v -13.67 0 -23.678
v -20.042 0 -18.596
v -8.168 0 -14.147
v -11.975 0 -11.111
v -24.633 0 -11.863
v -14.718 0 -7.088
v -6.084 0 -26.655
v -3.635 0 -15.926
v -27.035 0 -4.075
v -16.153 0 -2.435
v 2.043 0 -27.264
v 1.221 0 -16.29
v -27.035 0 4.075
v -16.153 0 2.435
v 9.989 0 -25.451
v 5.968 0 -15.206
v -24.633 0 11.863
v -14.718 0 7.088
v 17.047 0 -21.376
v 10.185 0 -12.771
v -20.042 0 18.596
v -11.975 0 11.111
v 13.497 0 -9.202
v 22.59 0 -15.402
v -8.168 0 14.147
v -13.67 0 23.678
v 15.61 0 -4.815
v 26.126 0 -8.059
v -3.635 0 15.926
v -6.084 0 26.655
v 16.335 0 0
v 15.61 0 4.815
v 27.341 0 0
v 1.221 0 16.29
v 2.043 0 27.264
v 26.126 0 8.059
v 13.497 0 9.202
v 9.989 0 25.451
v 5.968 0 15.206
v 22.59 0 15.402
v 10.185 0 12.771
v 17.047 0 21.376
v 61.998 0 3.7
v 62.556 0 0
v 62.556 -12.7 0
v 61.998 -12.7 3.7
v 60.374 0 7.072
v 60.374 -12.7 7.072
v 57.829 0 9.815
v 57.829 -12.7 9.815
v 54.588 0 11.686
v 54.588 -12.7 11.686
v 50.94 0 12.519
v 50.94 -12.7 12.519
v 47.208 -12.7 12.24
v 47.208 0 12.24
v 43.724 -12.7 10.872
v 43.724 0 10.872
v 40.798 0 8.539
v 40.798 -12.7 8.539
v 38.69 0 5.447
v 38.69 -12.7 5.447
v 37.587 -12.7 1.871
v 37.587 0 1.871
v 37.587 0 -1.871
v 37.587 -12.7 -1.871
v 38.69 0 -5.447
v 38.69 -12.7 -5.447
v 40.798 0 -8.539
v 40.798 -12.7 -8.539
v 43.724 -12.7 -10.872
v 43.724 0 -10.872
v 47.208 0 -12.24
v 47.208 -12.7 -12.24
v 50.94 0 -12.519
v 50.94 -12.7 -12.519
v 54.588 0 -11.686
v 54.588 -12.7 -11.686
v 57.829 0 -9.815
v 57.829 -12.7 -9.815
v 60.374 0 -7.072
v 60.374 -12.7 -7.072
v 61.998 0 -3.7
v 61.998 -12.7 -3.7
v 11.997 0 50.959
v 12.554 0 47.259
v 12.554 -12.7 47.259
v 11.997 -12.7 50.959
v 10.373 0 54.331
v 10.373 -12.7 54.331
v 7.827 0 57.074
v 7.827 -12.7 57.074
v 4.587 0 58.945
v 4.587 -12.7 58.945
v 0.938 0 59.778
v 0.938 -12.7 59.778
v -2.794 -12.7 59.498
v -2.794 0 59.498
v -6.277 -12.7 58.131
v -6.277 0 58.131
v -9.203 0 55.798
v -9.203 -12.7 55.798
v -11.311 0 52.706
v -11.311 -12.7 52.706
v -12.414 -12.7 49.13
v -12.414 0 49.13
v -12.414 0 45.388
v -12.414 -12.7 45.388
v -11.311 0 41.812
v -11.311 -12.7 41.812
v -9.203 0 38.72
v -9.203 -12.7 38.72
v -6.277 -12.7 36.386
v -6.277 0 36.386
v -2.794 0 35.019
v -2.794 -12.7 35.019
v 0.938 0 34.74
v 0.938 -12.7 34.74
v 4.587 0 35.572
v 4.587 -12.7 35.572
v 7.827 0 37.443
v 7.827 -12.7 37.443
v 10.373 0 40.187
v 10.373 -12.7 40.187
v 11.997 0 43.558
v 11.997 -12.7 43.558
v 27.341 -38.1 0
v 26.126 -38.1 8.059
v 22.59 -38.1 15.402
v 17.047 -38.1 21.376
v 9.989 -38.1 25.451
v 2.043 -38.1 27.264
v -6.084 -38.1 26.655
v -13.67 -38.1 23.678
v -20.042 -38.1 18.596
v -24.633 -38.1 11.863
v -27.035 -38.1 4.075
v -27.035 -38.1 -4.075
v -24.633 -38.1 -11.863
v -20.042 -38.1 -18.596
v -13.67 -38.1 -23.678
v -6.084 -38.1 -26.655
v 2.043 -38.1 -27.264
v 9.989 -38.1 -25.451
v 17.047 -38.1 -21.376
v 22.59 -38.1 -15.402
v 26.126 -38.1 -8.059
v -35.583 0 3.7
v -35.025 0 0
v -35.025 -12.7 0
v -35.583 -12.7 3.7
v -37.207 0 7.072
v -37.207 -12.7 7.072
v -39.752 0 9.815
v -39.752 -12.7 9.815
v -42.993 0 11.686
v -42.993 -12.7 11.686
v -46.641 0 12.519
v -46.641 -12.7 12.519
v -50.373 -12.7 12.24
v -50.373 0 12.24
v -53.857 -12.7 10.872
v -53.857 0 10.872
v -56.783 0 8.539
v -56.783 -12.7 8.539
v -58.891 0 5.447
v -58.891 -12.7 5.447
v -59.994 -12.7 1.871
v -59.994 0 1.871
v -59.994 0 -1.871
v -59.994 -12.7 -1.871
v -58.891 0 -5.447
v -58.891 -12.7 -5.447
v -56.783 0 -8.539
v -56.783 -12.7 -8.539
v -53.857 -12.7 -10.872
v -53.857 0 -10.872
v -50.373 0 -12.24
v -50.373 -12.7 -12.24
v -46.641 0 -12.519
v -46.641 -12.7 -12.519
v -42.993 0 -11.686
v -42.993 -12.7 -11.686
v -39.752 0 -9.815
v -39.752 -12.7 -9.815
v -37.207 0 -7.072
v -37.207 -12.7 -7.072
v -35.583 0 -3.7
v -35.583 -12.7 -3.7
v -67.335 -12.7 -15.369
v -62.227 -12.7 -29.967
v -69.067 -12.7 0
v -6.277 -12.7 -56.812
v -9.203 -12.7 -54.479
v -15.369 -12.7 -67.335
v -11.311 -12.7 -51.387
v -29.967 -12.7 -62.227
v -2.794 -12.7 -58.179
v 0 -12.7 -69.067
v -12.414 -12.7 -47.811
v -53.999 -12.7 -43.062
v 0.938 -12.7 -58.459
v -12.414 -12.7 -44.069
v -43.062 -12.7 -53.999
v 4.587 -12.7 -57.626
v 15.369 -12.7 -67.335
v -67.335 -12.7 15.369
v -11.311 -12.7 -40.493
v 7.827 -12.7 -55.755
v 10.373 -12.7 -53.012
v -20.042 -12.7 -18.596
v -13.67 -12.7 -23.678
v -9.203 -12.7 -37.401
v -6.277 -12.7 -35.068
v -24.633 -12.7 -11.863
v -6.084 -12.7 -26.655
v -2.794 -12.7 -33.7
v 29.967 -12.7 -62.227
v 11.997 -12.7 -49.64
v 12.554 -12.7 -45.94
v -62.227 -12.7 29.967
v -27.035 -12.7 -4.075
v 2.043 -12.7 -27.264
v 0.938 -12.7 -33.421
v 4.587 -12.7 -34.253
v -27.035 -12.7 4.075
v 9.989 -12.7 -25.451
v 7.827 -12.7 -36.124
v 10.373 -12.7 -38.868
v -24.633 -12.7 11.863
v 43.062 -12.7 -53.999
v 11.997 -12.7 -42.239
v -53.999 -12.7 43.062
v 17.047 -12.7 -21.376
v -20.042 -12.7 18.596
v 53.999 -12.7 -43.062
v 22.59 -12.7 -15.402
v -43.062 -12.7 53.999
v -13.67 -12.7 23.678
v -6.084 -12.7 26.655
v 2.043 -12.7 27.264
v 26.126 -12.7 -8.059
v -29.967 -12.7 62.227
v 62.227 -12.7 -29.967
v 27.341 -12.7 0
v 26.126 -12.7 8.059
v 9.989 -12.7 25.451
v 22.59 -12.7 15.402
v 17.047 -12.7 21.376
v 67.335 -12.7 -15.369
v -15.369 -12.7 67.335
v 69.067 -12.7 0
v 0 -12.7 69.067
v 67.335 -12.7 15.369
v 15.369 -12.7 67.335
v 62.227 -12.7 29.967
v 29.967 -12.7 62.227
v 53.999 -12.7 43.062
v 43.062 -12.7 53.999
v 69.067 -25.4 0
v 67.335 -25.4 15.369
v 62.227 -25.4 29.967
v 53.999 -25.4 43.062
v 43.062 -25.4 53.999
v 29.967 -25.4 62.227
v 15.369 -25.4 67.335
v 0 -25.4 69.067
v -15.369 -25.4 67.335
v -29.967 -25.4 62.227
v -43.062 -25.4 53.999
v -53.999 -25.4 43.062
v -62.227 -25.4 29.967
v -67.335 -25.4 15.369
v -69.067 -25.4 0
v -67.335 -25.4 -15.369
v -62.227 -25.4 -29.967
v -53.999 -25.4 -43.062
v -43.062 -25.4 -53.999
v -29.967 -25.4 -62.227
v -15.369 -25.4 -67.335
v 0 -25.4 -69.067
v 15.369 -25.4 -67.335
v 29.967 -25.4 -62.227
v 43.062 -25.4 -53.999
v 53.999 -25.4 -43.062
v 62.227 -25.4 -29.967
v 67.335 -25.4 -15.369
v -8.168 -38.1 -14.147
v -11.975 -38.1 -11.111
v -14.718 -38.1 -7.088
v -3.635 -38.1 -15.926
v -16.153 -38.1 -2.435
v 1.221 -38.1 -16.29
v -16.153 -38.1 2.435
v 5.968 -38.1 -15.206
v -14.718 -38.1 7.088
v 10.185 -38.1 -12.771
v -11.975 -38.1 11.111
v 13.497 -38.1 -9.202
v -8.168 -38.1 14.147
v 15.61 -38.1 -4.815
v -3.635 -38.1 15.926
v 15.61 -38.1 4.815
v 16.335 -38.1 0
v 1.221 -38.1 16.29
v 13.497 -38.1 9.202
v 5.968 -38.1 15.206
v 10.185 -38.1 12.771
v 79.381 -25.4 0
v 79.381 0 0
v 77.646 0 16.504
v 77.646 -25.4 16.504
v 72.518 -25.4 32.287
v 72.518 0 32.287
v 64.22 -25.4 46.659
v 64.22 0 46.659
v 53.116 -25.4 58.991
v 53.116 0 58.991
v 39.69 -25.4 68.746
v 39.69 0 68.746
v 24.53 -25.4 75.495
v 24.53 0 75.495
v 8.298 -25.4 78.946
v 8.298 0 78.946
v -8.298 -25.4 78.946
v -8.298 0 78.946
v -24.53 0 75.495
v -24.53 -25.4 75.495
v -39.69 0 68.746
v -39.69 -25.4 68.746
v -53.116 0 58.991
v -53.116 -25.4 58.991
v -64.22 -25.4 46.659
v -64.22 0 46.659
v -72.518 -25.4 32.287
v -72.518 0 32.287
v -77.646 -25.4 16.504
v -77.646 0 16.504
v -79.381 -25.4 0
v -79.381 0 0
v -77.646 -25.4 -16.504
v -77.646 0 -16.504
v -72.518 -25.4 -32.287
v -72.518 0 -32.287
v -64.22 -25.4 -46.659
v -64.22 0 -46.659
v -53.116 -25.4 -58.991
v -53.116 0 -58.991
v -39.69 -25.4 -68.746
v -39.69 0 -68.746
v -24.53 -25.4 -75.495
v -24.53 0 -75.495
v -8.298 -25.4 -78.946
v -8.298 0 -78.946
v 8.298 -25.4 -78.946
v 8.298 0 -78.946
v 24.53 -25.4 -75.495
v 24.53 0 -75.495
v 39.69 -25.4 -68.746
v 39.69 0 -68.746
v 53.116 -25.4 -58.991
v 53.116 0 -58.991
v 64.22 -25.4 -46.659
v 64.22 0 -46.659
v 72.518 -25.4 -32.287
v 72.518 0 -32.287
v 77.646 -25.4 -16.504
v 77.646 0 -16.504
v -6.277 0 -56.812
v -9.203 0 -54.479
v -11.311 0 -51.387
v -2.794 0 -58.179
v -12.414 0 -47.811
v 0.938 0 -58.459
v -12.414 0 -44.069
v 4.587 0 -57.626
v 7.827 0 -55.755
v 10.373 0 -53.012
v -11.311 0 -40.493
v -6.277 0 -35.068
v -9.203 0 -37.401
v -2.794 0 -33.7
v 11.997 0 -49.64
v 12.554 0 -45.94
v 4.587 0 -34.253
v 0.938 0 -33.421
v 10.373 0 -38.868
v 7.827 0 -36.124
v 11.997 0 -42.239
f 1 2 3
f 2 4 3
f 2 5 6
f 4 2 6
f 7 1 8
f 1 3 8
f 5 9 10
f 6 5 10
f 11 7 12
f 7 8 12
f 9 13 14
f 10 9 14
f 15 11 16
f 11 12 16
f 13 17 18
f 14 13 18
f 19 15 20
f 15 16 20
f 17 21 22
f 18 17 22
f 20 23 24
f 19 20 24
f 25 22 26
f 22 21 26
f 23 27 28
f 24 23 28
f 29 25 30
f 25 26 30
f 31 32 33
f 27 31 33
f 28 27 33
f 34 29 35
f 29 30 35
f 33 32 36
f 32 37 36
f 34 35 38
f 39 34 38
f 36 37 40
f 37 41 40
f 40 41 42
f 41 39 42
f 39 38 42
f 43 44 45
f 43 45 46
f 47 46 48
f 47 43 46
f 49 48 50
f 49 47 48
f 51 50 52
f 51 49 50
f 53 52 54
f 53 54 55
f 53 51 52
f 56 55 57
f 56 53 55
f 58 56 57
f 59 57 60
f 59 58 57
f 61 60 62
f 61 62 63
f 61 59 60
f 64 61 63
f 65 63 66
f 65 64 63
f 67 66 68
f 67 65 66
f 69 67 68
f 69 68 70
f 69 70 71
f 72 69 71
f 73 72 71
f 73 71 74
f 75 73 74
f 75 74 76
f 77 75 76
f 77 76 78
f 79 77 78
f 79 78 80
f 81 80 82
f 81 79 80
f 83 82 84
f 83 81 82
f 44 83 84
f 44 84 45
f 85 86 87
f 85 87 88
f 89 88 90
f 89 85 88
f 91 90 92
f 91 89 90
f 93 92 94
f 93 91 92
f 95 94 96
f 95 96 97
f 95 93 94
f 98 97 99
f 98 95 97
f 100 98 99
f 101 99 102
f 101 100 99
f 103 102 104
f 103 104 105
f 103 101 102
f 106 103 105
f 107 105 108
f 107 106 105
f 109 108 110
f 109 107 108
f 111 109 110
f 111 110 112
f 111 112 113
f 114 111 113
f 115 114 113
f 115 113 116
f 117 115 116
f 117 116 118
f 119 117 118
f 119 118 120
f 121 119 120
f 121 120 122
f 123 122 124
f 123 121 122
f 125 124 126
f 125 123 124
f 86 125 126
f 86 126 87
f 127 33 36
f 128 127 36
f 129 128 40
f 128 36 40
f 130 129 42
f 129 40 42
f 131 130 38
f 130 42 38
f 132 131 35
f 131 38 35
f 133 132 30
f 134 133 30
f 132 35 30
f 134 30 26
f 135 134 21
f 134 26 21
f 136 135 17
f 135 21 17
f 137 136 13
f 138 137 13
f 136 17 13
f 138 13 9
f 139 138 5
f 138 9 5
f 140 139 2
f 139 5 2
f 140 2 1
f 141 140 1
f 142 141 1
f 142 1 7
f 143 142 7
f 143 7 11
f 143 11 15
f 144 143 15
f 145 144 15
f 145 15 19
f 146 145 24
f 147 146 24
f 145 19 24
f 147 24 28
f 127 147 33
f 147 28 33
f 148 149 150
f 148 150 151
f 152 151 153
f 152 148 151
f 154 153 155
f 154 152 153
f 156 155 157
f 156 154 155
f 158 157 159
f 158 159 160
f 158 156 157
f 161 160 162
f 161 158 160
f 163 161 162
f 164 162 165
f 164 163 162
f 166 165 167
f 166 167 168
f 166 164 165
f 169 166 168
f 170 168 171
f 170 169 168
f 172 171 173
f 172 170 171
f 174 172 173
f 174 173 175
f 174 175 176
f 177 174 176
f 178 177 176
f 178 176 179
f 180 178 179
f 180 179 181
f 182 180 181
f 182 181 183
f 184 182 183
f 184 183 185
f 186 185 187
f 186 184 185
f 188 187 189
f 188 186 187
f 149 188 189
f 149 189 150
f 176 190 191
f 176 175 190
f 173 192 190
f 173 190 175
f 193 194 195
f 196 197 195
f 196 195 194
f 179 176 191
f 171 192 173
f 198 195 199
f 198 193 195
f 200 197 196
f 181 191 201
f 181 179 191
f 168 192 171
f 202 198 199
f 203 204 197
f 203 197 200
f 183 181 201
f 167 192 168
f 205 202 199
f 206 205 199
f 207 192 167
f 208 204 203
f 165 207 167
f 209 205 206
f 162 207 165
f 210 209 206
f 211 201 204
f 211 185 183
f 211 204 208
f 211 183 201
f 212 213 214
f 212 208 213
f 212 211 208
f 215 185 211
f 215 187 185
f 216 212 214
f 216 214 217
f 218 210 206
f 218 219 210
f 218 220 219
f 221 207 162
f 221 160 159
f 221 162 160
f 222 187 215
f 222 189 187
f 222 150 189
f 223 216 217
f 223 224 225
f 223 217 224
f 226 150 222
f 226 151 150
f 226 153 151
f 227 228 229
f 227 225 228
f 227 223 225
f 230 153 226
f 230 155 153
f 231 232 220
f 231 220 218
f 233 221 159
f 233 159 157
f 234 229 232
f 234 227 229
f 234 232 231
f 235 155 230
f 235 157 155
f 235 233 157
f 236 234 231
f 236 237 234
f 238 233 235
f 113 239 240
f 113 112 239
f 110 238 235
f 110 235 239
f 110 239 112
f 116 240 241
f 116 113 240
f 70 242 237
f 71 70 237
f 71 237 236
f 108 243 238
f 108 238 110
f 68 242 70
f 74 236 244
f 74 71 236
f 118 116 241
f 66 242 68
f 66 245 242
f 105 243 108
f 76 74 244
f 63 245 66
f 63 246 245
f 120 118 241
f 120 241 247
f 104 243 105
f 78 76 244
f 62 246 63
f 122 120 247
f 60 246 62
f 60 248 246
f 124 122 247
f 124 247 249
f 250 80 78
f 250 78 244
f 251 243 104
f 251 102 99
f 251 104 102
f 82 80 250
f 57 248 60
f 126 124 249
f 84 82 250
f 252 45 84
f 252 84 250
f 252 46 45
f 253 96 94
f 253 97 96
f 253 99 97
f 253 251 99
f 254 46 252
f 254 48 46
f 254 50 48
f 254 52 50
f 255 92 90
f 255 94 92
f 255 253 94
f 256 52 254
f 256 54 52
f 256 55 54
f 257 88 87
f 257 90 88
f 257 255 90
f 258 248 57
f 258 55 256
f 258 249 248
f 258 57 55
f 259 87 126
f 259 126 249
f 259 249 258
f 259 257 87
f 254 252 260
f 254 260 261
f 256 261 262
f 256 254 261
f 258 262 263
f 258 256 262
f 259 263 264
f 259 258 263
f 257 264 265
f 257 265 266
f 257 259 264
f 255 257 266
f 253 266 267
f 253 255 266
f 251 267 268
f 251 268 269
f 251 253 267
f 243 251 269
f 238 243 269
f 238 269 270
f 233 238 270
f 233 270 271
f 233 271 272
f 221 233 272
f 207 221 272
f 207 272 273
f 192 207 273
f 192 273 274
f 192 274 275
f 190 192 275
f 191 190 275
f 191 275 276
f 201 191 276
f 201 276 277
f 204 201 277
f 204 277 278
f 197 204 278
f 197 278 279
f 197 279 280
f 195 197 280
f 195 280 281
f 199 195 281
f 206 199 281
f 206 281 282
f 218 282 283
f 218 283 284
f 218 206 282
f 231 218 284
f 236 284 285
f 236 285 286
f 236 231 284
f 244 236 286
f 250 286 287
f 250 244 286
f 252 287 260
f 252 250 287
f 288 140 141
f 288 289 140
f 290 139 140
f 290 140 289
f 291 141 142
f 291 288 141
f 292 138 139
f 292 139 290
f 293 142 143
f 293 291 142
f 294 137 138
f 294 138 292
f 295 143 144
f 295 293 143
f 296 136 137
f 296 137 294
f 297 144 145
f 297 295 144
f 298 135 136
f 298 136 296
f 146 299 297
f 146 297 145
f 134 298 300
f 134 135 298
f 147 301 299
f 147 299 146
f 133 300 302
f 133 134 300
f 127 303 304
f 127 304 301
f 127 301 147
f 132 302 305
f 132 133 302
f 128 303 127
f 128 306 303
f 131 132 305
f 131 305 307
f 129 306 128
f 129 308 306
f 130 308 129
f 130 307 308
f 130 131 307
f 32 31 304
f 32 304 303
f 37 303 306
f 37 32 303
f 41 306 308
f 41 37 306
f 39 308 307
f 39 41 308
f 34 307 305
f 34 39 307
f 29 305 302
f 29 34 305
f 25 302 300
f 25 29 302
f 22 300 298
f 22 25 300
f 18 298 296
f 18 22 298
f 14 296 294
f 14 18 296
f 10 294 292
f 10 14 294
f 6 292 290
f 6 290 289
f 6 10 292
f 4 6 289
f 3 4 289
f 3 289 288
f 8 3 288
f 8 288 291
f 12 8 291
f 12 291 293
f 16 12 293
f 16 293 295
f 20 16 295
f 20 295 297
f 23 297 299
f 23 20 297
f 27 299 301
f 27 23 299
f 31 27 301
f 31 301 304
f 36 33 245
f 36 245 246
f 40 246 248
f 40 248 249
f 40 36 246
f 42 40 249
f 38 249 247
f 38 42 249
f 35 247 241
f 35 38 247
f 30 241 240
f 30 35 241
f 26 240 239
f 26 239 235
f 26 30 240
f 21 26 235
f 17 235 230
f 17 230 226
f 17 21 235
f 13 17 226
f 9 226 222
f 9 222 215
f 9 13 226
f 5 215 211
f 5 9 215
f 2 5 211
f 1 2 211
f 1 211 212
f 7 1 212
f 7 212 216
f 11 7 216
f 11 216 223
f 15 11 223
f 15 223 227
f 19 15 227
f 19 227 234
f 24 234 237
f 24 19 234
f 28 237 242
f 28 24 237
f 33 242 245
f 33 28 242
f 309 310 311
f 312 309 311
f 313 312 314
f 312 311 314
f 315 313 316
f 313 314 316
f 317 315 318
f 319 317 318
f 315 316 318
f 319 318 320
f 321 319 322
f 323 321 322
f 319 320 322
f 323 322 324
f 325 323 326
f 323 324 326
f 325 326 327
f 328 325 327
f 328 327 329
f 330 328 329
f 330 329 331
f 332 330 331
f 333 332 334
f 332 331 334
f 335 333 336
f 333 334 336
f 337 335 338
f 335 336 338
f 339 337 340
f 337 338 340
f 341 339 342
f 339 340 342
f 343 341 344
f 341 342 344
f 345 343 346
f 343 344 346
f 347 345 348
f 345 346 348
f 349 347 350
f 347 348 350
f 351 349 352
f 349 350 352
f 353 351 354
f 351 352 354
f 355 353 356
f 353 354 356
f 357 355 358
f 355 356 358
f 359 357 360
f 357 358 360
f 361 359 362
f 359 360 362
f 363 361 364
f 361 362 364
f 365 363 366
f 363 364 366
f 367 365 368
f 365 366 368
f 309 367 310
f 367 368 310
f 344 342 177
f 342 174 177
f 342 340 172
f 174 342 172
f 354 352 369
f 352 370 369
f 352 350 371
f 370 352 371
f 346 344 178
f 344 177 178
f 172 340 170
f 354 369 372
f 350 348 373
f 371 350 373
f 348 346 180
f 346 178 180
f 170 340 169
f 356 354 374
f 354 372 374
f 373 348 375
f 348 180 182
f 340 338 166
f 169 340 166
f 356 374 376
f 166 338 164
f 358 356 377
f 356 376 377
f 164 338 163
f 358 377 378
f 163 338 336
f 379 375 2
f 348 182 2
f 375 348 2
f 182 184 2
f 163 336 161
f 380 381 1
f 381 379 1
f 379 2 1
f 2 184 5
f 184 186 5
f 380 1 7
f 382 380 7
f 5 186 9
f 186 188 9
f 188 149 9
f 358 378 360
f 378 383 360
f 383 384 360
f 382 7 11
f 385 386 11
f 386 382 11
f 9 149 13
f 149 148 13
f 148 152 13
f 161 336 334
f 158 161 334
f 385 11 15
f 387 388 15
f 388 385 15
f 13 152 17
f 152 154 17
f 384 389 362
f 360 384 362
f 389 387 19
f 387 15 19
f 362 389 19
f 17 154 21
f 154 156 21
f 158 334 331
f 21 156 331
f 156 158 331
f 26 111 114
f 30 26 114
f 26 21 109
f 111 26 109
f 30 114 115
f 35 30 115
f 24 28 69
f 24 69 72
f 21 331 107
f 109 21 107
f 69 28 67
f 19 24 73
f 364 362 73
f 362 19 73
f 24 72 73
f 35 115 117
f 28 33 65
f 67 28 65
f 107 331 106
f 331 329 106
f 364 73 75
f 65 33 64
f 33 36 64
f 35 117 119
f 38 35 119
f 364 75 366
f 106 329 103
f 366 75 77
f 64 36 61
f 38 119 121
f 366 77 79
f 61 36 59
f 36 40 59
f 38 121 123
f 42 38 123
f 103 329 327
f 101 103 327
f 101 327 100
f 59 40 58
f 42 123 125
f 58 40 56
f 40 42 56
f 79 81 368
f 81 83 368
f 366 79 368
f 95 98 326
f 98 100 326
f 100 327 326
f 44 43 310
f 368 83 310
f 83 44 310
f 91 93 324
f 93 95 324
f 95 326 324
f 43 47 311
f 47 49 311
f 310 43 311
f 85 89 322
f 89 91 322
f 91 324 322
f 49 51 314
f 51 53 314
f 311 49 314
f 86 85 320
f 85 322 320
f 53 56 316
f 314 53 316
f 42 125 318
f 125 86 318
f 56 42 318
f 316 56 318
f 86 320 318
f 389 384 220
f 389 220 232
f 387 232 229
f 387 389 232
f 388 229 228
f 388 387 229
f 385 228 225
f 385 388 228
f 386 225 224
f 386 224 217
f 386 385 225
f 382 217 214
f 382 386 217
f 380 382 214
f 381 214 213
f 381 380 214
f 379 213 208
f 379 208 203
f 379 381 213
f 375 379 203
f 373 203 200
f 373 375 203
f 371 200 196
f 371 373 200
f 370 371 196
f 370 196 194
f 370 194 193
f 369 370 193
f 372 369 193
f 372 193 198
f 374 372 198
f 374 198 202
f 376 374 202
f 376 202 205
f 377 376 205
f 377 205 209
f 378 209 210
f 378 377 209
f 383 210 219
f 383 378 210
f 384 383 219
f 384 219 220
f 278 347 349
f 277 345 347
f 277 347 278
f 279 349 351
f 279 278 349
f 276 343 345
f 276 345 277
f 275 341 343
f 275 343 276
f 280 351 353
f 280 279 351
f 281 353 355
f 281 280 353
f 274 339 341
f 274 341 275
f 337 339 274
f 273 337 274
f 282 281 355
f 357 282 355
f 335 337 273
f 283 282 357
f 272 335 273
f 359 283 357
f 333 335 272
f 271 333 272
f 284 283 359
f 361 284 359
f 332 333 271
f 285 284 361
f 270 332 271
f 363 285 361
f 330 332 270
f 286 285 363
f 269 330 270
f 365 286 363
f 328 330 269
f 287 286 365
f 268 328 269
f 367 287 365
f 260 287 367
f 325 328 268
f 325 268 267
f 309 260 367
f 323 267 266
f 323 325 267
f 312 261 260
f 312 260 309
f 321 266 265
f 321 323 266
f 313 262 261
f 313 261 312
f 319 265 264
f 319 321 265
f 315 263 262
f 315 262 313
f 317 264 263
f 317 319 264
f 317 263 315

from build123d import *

# Parameters (mm, degrees)
F0_R     = 27.340832
F0_R_2   = 16.335261
F1_DEPTH = 38.1
F0_R_3   = 69.066802
F0_R_4   = 12.554294
F2_DEPTH = 12.7
F0_R_5   = 79.380509
F3_DEPTH = 25.4


with BuildPart() as f1:
    # F0 (on Front) → F1 (new body)
    with BuildSketch(Plane.XZ):
        Circle(F0_R)
        Circle(F0_R_2, mode=Mode.SUBTRACT)
    extrude(amount=F1_DEPTH)


with BuildPart() as f2:
    # F0 (on Front) → F2 (new body)
    with BuildSketch(Plane.XZ):
        Circle(F0_R_3)
        with Locations((0, -45.93984)):
            Circle(F0_R_4, mode=Mode.SUBTRACT)
        with Locations((-47.579579, 0)):
            Circle(F0_R_4, mode=Mode.SUBTRACT)
        Circle(F0_R, mode=Mode.SUBTRACT)
        with Locations((50.001394, 0)):
            Circle(F0_R_4, mode=Mode.SUBTRACT)
        with Locations((0, 47.258757)):
            Circle(F0_R_4, mode=Mode.SUBTRACT)
    extrude(amount=F2_DEPTH)

    # F0 (on Front) → F3 (join)
    with BuildSketch(Plane.XZ):
        Circle(F0_R_5)
        Circle(F0_R_3, mode=Mode.SUBTRACT)
    extrude(amount=F3_DEPTH)


solid = Compound([f1.part, f2.part])
